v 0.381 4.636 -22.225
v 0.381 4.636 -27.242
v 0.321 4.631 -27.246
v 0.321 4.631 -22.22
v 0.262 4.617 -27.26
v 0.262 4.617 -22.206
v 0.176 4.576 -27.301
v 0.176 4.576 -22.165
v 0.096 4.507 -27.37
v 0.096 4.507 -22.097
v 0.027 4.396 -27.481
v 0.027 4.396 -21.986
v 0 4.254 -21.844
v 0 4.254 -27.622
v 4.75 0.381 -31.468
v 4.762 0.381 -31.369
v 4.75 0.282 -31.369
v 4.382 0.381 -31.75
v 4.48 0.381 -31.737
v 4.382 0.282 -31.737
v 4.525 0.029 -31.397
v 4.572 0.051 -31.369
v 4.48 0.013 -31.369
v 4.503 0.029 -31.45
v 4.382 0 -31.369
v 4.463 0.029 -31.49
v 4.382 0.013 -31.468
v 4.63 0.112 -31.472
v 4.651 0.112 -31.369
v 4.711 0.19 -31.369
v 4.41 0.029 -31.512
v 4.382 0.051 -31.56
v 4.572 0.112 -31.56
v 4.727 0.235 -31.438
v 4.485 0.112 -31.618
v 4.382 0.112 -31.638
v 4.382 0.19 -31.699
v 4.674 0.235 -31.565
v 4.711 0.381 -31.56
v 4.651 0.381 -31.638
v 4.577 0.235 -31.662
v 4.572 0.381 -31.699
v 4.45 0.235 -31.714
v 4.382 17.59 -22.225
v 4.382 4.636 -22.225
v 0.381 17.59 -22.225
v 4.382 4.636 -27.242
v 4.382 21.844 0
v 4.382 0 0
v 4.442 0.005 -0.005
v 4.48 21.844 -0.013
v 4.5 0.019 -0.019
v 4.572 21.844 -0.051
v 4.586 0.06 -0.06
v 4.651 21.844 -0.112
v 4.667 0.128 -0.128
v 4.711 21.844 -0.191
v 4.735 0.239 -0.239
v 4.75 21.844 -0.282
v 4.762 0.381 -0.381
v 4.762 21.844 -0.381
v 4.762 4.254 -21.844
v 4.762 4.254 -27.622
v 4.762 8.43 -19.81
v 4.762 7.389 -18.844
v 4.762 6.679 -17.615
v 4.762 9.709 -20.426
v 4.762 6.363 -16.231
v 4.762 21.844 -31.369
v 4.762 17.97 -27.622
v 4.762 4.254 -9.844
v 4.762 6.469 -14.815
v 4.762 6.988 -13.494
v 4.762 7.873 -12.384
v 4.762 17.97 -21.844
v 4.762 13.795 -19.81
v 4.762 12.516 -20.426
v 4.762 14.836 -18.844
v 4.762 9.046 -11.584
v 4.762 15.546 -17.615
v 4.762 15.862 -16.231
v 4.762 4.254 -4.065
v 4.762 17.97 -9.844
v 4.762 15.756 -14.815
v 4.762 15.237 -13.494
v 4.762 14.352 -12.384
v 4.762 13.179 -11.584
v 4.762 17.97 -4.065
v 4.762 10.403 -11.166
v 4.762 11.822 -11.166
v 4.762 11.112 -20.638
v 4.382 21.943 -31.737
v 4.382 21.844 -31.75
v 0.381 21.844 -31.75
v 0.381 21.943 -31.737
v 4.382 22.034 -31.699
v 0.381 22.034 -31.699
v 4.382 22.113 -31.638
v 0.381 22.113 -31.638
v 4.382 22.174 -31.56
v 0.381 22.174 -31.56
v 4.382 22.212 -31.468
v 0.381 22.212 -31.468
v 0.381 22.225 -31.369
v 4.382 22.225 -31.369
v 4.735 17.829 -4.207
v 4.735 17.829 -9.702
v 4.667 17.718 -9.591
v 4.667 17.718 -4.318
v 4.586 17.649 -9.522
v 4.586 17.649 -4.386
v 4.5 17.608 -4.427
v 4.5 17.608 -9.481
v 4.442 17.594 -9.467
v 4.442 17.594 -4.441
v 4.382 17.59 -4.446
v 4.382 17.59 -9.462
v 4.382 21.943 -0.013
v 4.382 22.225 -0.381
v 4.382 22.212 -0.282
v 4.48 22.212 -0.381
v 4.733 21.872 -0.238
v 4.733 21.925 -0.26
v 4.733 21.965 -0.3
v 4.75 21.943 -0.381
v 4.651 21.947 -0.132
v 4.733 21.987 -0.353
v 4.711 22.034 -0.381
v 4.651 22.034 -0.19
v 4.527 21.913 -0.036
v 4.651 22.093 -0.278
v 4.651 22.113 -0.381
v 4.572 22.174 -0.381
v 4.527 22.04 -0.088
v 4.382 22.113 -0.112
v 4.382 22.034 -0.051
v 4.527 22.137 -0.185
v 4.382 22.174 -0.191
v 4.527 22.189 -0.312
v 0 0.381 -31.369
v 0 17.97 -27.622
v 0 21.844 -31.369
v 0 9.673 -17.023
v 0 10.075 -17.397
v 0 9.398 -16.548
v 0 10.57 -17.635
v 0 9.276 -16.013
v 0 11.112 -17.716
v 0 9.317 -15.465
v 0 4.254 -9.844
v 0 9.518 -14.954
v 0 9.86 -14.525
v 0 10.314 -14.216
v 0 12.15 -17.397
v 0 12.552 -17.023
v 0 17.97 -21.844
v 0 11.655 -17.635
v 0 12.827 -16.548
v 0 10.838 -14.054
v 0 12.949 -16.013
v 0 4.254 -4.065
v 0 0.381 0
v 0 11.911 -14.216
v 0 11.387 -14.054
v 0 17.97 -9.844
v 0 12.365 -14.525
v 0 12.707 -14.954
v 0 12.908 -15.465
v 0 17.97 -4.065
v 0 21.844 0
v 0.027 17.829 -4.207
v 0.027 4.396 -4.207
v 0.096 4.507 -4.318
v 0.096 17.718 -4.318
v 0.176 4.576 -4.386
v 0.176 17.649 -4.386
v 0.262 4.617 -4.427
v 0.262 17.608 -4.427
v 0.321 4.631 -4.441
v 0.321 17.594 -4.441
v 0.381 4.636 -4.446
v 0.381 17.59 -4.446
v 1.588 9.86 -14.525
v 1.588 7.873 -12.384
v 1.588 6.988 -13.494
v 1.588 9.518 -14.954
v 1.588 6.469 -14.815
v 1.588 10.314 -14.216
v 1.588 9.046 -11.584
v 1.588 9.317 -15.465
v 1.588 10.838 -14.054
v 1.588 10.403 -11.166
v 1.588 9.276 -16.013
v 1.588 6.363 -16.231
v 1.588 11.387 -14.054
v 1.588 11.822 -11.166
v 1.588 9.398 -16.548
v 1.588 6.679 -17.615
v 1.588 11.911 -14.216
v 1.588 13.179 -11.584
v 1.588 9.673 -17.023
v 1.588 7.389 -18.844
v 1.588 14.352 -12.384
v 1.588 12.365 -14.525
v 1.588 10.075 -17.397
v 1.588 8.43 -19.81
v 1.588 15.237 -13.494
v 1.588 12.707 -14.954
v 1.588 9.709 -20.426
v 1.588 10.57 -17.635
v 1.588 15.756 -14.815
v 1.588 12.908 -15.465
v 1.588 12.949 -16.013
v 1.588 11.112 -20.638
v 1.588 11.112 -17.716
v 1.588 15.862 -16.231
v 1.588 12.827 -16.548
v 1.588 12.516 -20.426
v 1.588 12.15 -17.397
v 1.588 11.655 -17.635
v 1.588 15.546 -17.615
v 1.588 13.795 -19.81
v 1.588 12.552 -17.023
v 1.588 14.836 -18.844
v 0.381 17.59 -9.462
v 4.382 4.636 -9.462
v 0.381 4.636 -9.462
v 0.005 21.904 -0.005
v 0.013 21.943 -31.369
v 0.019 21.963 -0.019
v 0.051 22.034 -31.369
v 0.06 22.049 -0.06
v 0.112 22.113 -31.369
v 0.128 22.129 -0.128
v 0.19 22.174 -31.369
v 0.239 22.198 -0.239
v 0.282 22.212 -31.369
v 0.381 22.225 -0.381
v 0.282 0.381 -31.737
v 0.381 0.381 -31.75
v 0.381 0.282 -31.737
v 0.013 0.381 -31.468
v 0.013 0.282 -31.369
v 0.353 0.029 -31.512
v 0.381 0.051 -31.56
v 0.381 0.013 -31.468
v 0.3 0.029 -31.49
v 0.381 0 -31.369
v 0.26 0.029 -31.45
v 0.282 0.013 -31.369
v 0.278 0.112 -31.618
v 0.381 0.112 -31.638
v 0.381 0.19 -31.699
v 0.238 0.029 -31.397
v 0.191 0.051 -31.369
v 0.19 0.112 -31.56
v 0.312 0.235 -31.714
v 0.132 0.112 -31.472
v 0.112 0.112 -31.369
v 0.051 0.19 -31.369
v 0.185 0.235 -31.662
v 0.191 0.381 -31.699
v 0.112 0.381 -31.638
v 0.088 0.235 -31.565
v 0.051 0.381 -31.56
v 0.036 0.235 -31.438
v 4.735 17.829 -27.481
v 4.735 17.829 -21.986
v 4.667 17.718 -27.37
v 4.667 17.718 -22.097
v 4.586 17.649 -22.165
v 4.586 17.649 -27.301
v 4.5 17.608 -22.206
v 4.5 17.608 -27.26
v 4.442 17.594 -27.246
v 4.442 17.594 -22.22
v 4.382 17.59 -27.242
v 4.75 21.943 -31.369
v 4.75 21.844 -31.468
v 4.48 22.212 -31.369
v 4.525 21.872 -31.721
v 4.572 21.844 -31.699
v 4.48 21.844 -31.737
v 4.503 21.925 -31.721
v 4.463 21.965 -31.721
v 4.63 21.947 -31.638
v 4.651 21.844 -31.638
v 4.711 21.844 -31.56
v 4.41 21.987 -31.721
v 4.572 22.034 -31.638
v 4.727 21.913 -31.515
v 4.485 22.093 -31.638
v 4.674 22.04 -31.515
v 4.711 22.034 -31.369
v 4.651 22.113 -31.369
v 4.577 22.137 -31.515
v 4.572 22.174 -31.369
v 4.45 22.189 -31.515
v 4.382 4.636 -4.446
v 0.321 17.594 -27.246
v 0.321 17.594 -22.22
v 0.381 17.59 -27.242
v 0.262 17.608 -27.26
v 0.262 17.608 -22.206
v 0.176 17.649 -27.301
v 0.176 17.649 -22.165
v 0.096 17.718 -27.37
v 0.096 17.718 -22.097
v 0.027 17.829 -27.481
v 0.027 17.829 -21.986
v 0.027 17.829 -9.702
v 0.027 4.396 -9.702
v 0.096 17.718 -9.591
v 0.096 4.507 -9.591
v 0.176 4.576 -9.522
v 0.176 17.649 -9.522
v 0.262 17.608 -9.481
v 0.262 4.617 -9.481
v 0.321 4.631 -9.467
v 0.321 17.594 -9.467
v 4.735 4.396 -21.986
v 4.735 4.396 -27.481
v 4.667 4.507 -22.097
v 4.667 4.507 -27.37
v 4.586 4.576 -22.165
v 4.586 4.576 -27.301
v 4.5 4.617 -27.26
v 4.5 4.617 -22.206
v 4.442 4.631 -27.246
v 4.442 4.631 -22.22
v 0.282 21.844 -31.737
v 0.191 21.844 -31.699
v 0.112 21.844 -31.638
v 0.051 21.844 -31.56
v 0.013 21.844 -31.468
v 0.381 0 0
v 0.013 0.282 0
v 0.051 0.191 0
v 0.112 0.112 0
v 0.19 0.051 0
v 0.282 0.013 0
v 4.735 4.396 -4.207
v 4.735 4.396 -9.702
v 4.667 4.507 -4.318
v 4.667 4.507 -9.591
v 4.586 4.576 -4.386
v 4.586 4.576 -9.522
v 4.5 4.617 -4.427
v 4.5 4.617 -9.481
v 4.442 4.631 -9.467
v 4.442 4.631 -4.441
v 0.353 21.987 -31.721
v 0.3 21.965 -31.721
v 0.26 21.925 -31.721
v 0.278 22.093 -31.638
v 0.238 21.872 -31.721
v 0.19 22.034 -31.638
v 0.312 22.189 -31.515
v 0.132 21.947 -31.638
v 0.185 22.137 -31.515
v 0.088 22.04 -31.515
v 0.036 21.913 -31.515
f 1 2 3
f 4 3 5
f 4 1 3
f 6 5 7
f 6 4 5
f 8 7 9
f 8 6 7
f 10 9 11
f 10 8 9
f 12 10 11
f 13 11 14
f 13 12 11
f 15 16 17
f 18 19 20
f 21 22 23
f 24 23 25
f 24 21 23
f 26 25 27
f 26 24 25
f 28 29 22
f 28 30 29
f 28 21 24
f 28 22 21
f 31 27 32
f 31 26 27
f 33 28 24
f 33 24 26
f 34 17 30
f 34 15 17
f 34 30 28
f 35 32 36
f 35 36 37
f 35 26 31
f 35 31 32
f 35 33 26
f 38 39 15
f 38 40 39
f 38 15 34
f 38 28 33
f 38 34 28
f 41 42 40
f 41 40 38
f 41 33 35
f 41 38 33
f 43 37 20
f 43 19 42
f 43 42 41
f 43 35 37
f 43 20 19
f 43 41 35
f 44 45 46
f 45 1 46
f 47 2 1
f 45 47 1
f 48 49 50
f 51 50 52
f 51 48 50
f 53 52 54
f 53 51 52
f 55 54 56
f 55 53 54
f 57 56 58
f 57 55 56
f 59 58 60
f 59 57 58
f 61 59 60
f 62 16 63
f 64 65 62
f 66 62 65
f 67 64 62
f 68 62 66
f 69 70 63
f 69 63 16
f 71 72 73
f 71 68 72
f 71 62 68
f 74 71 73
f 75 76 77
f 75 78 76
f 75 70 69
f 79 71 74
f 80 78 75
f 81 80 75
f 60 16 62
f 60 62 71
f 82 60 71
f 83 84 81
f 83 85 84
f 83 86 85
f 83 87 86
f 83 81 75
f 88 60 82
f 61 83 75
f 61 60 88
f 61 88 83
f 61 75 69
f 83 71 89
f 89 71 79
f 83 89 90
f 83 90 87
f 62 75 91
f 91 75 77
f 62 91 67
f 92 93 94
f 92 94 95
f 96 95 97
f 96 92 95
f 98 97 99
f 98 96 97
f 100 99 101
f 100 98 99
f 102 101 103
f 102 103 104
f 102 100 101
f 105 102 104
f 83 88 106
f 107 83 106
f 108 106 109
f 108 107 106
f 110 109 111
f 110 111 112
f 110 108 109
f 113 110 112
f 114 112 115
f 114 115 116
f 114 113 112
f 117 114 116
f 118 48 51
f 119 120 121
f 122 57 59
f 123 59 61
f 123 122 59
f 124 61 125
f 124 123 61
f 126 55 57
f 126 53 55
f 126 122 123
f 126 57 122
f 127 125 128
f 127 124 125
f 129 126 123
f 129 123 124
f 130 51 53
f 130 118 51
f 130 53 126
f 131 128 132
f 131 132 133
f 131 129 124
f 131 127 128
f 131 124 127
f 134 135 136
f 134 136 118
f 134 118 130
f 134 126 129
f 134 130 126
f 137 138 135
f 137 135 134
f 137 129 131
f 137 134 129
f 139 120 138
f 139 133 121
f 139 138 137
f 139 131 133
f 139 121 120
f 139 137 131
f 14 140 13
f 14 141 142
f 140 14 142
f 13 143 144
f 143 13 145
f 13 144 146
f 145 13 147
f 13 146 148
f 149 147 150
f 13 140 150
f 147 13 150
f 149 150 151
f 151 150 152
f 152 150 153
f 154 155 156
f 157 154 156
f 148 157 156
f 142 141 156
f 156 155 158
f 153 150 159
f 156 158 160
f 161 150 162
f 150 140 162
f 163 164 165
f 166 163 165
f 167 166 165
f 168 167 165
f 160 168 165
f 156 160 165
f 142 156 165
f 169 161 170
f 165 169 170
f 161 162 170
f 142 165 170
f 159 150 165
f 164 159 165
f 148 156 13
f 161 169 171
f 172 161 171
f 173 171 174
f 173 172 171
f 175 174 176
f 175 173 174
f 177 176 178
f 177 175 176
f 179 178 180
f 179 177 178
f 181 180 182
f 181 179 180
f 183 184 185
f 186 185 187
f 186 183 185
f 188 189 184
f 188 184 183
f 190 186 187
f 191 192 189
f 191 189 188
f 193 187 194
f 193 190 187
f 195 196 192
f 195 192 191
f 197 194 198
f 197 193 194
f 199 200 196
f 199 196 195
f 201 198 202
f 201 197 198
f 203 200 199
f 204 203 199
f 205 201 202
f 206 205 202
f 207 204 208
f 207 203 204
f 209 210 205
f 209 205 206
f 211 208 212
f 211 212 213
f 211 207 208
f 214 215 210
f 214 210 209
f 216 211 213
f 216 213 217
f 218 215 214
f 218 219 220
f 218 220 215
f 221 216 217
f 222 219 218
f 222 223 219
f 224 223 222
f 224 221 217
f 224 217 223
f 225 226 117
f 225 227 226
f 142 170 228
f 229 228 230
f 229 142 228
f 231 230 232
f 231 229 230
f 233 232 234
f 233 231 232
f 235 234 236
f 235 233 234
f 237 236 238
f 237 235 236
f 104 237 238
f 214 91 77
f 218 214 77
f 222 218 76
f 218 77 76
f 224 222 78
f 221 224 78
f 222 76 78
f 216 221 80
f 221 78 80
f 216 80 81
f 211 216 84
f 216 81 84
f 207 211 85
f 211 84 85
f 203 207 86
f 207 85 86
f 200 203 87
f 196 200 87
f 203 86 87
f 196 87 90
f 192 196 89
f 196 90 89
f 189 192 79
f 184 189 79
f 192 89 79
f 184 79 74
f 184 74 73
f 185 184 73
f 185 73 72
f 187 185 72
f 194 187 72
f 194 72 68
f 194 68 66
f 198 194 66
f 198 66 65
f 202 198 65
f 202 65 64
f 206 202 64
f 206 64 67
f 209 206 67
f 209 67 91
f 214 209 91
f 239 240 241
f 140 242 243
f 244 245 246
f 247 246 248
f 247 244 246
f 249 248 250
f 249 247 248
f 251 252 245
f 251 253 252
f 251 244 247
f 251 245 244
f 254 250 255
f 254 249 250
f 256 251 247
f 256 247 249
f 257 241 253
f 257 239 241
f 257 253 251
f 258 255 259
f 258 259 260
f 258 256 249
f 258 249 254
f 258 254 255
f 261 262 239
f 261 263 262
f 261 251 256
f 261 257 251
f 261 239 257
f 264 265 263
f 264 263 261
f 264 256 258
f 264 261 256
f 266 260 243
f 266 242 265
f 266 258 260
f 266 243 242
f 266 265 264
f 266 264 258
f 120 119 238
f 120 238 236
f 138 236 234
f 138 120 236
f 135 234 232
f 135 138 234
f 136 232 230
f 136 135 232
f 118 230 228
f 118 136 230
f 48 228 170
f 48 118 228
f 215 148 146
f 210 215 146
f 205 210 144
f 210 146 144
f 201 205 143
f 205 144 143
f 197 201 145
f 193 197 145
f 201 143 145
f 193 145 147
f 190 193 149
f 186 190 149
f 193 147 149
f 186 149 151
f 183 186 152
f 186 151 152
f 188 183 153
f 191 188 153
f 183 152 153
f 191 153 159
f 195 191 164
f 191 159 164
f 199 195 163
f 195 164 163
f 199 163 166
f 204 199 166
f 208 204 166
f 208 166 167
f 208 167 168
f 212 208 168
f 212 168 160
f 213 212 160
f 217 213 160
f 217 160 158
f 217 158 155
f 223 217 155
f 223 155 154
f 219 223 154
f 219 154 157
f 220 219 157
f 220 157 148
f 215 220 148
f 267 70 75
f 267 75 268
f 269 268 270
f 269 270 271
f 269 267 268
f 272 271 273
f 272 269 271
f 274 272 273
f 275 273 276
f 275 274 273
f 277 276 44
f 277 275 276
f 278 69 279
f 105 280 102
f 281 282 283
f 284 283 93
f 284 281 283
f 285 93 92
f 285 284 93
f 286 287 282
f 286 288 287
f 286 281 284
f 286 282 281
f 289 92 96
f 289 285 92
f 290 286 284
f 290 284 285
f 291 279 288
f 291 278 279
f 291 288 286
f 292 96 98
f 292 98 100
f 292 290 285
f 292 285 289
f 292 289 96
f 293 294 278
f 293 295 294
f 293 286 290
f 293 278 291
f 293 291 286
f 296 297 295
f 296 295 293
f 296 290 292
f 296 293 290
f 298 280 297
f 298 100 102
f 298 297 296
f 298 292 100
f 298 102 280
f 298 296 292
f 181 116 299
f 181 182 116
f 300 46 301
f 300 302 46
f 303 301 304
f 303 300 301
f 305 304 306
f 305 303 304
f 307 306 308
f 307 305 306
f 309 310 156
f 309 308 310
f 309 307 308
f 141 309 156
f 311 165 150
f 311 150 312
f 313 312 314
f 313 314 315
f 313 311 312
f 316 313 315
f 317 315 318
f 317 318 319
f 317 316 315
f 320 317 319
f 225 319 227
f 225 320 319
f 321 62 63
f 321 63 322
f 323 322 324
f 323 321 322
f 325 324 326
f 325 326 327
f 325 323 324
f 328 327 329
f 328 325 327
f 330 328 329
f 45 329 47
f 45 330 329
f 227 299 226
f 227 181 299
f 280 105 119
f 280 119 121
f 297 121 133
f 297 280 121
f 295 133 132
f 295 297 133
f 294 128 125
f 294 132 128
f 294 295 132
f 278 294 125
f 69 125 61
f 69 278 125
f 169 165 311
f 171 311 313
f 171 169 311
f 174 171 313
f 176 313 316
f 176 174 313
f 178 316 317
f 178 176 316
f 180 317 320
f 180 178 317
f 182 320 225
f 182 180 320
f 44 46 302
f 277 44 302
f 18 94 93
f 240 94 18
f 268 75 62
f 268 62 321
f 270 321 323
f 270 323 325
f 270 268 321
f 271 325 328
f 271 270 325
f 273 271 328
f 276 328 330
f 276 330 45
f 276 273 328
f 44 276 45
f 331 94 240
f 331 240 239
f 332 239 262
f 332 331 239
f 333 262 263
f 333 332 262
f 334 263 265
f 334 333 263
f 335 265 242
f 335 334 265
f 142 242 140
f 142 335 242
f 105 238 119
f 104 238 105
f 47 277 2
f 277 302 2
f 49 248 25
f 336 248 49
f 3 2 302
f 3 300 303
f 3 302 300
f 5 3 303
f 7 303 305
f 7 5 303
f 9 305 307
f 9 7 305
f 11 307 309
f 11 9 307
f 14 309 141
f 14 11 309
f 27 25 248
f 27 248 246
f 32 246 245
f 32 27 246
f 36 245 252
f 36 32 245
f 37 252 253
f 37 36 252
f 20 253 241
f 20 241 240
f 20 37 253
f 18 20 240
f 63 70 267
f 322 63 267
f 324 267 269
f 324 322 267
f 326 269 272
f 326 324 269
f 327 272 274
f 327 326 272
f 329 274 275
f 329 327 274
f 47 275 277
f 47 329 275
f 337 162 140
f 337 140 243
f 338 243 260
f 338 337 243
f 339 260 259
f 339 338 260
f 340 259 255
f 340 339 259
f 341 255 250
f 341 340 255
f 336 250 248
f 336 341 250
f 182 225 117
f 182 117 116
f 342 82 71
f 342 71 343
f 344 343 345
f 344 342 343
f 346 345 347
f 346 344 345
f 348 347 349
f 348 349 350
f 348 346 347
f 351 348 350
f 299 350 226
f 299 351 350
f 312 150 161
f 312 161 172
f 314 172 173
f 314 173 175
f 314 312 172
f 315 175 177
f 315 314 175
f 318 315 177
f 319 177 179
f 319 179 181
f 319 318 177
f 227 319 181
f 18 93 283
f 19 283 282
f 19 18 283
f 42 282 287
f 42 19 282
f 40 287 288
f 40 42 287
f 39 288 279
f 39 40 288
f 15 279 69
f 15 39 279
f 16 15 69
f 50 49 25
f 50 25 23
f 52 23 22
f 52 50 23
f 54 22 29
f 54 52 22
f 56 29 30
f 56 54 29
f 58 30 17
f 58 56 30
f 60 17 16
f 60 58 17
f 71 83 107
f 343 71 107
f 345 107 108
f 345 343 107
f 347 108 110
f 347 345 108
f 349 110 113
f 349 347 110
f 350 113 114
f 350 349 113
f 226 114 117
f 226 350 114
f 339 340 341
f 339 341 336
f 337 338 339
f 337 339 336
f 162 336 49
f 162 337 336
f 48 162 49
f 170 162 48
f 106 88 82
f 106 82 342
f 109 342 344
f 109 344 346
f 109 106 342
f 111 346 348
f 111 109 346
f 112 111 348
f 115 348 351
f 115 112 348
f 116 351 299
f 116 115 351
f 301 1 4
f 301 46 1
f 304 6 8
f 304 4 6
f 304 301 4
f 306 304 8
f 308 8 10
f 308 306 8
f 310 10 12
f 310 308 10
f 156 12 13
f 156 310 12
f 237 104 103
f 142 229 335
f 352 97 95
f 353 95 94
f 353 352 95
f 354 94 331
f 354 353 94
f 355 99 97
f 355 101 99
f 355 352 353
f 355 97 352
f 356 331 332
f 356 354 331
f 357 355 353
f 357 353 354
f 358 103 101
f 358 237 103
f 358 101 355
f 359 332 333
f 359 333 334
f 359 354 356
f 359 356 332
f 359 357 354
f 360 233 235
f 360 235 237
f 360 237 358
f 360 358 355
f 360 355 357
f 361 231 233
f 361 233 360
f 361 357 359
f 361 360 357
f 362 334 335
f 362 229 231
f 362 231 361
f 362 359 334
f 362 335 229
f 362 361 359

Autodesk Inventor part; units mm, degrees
ref_plane "YZ Plane" through (0, 0, 0) normal (1, 0, 0) x (0, 1, 0)
ref_plane "XZ Plane" through (0, 0, 0) normal (0, 1, 0) x (-1, 0, 0)
ref_plane "XY Plane" through (0, 0, 0) normal (0, 0, 1) x (1, 0, 0)
sketch "Sketch1" plane through (0, 0, 0) normal (1, 0, 0) x (0, 1, 0)
  line L0 (22.225, 0) -> (22.225, -31.75)
  line L1 (22.225, -31.75) -> (0, -31.75)
  line L2 (0, -31.75) -> (0, 0)
  line L3 (17.5895, -4.446) -> (4.5769, -4.446)
  line L4 (6.35, -31.75) -> (25.4, -31.75)
  line L5 (0, 0) -> (4.7625, 0)
  line L6 (17.5895, 0) -> (22.225, 0)
  line L7 (4.6355, -22.225) -> (17.5895, -22.225)
  line L8 (17.5895, -22.225) -> (17.5895, -27.2415)
  line L9 (17.5895, -27.2415) -> (4.6355, -27.2415)
  line L10 (4.6355, -27.2415) -> (4.6355, -22.225)
  line L11 (22.225, 0) -> (0, 0)
  line L12 (17.5895, -4.446) -> (4.6355, -4.446)
  line L13 (4.6355, -4.446) -> (4.6355, -9.4625)
  line L14 (4.6355, -9.4625) -> (17.5895, -9.4625)
  line L15 (17.5895, -9.4625) -> (17.5895, -4.446)
  dimension "d8" = 12.954
  dimension "d9" = 5.0165
  dimension "d10" = 4.5085
  dimension "d11" = 4.6355
  dimension "d28" = 4.6355
  dimension "d37" = 31.75
  dimension "d38" = 31.75
  dimension "d43" = 5.0165
  dimension "d48" = 12.954
  dimension "d49" = 4.6355
extrude "Extrusion1" add sketch "Sketch1" along normal blind 4.7625 contours L0 L1 L2 L5 L11 L6 | L15 L14 L13 L3
sketch "Sketch2" plane through (4.7625, 0, 0) normal (1, 0, 0) x (0, 0, -1)
  line L0 (22.225, 17.5895) -> (27.2415, 17.5895) projected
  line L1 (27.2415, 17.5895) -> (27.2415, 4.6355) projected
  line L2 (27.2415, 4.6355) -> (22.225, 4.6355) projected
  line L3 (22.225, 4.6355) -> (22.225, 17.5895) projected
  line L4 (0, 0) -> (31.75, 0) projected
  line L5 (31.75, 0) -> (31.75, 22.225) projected
  line L6 (31.75, 22.225) -> (0, 22.225) projected
  circle A0 centre (15.875, 11.1125) radius 4.7625
  line L7 (0, 22.225) -> (0, 0) projected
  dimension "d14" = 9.525
  dimension "d15" = 11.1125
  dimension "d39" = 22.225
  dimension "d52" = 31.75
  dimension "d53" = 15.875
extrude "Extrusion2" cut sketch "Sketch2" against normal blind 3.175 contours A0
extrude "Extrusion5" cut sketch "Sketch1" along normal blind 25.4 contours L15 L14 L13 L3
sketch "Sketch5" plane through (4.7625, 0, 0) normal (1, 0, 0) x (0, 0, -1)
  circle A0 centre (15.875, 11.1125) radius 4.7625 projected
  point P0 (0, 0)
hole "Hole1" at (4.7625, 11.1125, -15.875) direction (-1, 0, 0) diameter 3.683 depth 14.9352 tip angle 118 thread size "10-24 UNC" class "2B" standard "ANSI Unified Screw Threads"
fillet "Fillet1" radius 0.381 26 edges at (0, 22.225, -15.875) (2.3813, 22.225, 0) (4.7625, 22.225, -15.875) (4.7625, 11.1125, -31.75) (0, 11.1125, -31.75) (4.7625, 0, -15.875) (2.3813, 0, -31.75) (4.7625, 11.1125, 0) (4.7625, 11.1125, -4.446) (4.7625, 17.5895, -6.9542) (4.7625, 11.1125, -9.4625) (4.7625, 4.6355, -6.9542) (0, 4.6355, -6.9542) (0, 11.1125, -4.446) (2.3813, 22.225, -31.75) (4.7625, 17.5895, -24.7332) (4.7625, 11.1125, -22.225) (4.7625, 4.6355, -24.7332) (4.7625, 11.1125, -27.2415) (0, 17.5895, -24.7332) (0, 11.1125, -27.2415) (0, 11.1125, -22.225) (0, 4.6355, -24.7332) (0, 11.1125, -9.4625) (0, 17.5895, -6.9542) (0, 0, -15.875)
equation "\"d28\" = d11"
equation "\"d38\" = d37"
equation "\"d15\" = 0.5 * d39"
equation "\"d53\" = 0.5 * d52"
equation "\"d32\" = 0.5 * d31"
equation "\"d31\" = 6.274854"
properties part number "TensionerPlate"
